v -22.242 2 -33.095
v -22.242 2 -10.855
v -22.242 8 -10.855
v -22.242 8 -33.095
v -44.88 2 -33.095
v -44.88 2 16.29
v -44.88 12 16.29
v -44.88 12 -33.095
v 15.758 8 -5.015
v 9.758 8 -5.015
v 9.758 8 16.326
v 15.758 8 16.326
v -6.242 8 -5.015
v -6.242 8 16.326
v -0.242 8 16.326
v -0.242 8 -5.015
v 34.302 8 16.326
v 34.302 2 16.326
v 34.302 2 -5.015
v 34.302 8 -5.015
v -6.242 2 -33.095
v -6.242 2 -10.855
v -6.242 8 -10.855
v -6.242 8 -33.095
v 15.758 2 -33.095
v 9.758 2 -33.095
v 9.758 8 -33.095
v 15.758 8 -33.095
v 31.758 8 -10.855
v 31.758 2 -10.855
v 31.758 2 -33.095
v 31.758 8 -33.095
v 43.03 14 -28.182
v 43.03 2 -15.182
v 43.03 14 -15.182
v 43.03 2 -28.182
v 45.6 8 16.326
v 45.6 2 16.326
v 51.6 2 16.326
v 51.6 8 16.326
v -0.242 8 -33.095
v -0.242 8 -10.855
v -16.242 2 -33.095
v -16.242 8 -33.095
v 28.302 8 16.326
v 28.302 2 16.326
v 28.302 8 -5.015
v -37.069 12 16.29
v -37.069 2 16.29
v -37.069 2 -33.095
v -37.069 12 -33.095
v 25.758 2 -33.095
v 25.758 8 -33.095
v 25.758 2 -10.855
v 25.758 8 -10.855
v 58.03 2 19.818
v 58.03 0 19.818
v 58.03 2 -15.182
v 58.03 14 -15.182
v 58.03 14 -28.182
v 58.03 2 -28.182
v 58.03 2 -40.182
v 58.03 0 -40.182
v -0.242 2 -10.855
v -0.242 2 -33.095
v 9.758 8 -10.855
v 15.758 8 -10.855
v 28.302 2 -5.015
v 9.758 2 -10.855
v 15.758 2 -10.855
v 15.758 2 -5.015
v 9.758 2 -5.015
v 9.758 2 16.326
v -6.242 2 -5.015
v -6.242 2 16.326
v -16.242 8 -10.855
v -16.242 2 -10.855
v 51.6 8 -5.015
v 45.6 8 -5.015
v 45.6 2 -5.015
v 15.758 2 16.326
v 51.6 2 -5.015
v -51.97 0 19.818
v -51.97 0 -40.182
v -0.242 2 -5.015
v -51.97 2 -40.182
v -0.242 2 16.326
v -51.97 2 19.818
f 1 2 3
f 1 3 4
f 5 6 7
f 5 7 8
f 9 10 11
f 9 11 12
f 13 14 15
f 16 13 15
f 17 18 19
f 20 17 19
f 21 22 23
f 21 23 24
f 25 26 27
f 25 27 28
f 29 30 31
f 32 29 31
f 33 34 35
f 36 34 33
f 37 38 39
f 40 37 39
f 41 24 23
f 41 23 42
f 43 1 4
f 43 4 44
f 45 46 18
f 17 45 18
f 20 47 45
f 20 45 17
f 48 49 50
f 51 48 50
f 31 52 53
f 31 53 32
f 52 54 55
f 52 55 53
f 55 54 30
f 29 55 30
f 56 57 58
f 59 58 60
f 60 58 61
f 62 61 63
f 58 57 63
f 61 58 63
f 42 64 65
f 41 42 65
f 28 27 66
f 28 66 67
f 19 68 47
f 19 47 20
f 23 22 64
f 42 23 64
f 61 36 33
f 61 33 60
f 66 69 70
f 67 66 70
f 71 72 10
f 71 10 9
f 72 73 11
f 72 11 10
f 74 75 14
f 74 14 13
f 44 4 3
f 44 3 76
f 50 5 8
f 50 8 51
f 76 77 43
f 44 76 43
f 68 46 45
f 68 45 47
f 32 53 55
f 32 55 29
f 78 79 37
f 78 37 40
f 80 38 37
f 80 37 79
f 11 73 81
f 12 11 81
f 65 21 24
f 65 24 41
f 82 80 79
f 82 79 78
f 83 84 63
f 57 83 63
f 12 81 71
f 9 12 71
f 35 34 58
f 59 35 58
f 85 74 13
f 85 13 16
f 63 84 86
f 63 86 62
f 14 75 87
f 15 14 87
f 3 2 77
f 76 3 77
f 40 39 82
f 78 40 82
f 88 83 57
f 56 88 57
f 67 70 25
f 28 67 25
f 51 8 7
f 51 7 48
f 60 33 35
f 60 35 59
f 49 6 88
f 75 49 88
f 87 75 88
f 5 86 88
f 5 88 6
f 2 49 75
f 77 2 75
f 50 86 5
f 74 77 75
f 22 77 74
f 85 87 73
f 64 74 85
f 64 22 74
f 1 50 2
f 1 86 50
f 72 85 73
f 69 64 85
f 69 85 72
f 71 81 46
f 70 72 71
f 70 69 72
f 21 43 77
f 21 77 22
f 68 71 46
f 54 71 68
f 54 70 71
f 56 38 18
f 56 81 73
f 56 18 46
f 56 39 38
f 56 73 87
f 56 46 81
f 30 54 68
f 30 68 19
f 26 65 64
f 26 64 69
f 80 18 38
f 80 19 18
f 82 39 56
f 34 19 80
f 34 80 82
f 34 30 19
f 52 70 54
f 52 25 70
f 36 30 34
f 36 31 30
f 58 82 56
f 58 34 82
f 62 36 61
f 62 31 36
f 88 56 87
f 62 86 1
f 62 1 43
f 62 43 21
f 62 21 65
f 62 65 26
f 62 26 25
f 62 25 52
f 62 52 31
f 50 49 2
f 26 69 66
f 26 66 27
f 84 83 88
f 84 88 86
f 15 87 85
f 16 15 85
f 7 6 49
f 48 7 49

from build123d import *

# Parameters (mm, degrees)
SKETCH1_W           = 110
SKETCH1_H           = 60
BOSS_EXTRUDE1_DEPTH = 2
SKETCH2_W           = 15
SKETCH2_H           = 13
BOSS_EXTRUDE2_DEPTH = 12
SKETCH3_W           = 6
SKETCH3_H           = 22.239539295
SKETCH3_H_2         = 21.340972051
BOSS_EXTRUDE3_DEPTH = 6
SKETCH4_W           = 7.81140843
SKETCH4_H           = 49.385459964
BOSS_EXTRUDE4_DEPTH = 10


with BuildPart() as part:
    # Sketch1 → Boss-Extrude1 (new body)
    with BuildSketch(Plane(origin=(0, 0, 0), x_dir=(1, 0, 0), z_dir=(0, 1, 0))):
        with Locations((3.029999611, 10.181542367)):
            Rectangle(SKETCH1_W, SKETCH1_H)
    extrude(amount=BOSS_EXTRUDE1_DEPTH)

    # Sketch2 → Boss-Extrude2 (add)
    with BuildSketch(Plane(origin=(0, 2, 0), x_dir=(1, 0, 0), z_dir=(0, 1, 0))):
        with Locations((50.529999611, 21.681542367)):
            Rectangle(SKETCH2_W, SKETCH2_H)
    extrude(amount=BOSS_EXTRUDE2_DEPTH)

    # Sketch3 → Boss-Extrude3 (add)
    with BuildSketch(Plane(origin=(0, 2, 0), x_dir=(1, 0, 0), z_dir=(0, 1, 0))):
        with Locations((28.757795867, 21.975237447)):
            Rectangle(SKETCH3_W, SKETCH3_H)
        with Locations((12.757795867, 21.975237447)):
            Rectangle(SKETCH3_W, SKETCH3_H)
        with Locations((-3.242204133, 21.975237447)):
            Rectangle(SKETCH3_W, SKETCH3_H)
        with Locations((-19.242204133, 21.975237447)):
            Rectangle(SKETCH3_W, SKETCH3_H)
        with Locations((48.599622808, -5.655705314)):
            Rectangle(SKETCH3_W, SKETCH3_H_2)
        with Locations((31.302203356, -5.655705314)):
            Rectangle(SKETCH3_W, SKETCH3_H_2)
        with Locations((12.757795867, -5.655705314)):
            Rectangle(SKETCH3_W, SKETCH3_H_2)
        with Locations((-3.242204133, -5.655705314)):
            Rectangle(SKETCH3_W, SKETCH3_H_2)
    extrude(amount=BOSS_EXTRUDE3_DEPTH)

    # Sketch4 → Boss-Extrude4 (add)
    with BuildSketch(Plane(origin=(0, 2, 0), x_dir=(1, 0, 0), z_dir=(0, 1, 0))):
        with Locations((-40.974267879, 8.402277113)):
            Rectangle(SKETCH4_W, SKETCH4_H)
    extrude(amount=BOSS_EXTRUDE4_DEPTH)


solid = part.part
